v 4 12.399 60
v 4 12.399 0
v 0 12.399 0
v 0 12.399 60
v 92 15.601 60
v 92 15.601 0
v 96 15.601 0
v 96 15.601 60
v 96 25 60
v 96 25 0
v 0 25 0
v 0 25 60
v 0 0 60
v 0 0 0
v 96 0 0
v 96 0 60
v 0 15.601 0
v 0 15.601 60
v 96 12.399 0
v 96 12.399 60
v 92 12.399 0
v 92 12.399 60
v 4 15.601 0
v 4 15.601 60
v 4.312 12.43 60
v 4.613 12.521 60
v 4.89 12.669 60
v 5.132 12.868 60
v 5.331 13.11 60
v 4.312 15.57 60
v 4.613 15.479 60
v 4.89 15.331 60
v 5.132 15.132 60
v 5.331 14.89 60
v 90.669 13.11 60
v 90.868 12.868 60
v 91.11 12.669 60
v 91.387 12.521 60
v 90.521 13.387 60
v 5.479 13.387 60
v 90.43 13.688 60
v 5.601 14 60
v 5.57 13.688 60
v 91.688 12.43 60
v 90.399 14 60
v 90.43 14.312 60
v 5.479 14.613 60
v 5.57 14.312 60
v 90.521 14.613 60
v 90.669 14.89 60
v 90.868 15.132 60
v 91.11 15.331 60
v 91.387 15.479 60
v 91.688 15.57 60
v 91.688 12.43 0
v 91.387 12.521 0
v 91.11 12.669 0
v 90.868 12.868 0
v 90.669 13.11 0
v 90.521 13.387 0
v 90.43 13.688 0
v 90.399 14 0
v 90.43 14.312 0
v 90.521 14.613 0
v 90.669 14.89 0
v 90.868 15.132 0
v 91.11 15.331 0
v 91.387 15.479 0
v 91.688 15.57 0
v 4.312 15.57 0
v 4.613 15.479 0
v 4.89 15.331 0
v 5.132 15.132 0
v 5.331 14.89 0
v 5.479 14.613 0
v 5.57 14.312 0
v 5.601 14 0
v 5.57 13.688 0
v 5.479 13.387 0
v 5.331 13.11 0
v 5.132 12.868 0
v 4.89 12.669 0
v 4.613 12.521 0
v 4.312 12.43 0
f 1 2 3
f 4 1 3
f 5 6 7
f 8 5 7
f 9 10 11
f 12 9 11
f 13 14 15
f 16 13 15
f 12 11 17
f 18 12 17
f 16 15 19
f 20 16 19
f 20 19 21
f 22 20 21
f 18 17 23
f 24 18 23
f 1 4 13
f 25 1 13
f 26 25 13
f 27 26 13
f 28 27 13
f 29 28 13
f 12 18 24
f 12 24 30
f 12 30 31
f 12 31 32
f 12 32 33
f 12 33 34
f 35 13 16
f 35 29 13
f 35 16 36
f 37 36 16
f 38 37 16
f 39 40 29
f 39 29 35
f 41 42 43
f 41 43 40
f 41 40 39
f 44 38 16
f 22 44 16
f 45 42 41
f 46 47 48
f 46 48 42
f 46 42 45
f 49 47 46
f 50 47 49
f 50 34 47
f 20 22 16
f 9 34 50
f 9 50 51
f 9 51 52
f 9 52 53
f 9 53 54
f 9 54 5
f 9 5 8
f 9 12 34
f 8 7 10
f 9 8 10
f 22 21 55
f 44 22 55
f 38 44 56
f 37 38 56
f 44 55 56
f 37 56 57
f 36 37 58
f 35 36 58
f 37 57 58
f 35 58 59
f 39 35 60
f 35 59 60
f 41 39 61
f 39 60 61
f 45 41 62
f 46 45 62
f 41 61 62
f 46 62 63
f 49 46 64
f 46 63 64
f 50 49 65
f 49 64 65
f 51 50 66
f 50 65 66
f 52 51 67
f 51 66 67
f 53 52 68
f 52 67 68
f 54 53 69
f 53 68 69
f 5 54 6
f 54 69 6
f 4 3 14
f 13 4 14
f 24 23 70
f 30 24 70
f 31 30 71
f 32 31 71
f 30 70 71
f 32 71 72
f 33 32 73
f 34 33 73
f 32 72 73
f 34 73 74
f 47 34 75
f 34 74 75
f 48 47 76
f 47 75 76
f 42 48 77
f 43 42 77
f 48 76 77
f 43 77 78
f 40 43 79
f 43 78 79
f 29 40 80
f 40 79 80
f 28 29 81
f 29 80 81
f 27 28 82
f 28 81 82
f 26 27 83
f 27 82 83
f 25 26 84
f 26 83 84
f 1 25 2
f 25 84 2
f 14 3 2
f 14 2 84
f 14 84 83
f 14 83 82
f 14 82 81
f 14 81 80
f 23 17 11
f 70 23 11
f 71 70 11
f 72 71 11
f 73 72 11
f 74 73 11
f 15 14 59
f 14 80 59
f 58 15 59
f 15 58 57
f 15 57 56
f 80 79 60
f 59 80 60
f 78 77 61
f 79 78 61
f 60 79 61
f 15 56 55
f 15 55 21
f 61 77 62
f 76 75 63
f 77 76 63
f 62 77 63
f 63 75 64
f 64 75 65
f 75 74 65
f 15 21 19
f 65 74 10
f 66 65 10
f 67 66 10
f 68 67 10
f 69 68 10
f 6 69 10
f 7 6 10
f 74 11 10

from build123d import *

# Parameters (mm, degrees)
ESTRUSIONE_ESTRUSIONE1_DEPTH = 60


with BuildPart() as part:
    # Schizzo1 → Estrusione-Estrusione1 (new body)
    with BuildSketch(Plane.XY):
        with BuildLine():
            Line((0, 0), (96, 0))
            Line((96, 0), (96, 12.398749749))
            Line((96, 12.398749749), (92, 12.398749749))
            ThreePointArc((92, 12.398749749), (90.398749749, 14), (92, 15.601250251))
            Line((92, 15.601250251), (96, 15.601250251))
            Line((96, 15.601250251), (96, 25))
            Line((96, 25), (0, 25))
            Line((0, 25), (0, 15.601250251))
            Line((0, 15.601250251), (4, 15.601250251))
            ThreePointArc((4, 15.601250251), (5.601250251, 14), (4, 12.398749749))
            Line((4, 12.398749749), (0, 12.398749749))
            Line((0, 12.398749749), (0, 0))
        make_face()
    extrude(amount=ESTRUSIONE_ESTRUSIONE1_DEPTH)


solid = part.part
